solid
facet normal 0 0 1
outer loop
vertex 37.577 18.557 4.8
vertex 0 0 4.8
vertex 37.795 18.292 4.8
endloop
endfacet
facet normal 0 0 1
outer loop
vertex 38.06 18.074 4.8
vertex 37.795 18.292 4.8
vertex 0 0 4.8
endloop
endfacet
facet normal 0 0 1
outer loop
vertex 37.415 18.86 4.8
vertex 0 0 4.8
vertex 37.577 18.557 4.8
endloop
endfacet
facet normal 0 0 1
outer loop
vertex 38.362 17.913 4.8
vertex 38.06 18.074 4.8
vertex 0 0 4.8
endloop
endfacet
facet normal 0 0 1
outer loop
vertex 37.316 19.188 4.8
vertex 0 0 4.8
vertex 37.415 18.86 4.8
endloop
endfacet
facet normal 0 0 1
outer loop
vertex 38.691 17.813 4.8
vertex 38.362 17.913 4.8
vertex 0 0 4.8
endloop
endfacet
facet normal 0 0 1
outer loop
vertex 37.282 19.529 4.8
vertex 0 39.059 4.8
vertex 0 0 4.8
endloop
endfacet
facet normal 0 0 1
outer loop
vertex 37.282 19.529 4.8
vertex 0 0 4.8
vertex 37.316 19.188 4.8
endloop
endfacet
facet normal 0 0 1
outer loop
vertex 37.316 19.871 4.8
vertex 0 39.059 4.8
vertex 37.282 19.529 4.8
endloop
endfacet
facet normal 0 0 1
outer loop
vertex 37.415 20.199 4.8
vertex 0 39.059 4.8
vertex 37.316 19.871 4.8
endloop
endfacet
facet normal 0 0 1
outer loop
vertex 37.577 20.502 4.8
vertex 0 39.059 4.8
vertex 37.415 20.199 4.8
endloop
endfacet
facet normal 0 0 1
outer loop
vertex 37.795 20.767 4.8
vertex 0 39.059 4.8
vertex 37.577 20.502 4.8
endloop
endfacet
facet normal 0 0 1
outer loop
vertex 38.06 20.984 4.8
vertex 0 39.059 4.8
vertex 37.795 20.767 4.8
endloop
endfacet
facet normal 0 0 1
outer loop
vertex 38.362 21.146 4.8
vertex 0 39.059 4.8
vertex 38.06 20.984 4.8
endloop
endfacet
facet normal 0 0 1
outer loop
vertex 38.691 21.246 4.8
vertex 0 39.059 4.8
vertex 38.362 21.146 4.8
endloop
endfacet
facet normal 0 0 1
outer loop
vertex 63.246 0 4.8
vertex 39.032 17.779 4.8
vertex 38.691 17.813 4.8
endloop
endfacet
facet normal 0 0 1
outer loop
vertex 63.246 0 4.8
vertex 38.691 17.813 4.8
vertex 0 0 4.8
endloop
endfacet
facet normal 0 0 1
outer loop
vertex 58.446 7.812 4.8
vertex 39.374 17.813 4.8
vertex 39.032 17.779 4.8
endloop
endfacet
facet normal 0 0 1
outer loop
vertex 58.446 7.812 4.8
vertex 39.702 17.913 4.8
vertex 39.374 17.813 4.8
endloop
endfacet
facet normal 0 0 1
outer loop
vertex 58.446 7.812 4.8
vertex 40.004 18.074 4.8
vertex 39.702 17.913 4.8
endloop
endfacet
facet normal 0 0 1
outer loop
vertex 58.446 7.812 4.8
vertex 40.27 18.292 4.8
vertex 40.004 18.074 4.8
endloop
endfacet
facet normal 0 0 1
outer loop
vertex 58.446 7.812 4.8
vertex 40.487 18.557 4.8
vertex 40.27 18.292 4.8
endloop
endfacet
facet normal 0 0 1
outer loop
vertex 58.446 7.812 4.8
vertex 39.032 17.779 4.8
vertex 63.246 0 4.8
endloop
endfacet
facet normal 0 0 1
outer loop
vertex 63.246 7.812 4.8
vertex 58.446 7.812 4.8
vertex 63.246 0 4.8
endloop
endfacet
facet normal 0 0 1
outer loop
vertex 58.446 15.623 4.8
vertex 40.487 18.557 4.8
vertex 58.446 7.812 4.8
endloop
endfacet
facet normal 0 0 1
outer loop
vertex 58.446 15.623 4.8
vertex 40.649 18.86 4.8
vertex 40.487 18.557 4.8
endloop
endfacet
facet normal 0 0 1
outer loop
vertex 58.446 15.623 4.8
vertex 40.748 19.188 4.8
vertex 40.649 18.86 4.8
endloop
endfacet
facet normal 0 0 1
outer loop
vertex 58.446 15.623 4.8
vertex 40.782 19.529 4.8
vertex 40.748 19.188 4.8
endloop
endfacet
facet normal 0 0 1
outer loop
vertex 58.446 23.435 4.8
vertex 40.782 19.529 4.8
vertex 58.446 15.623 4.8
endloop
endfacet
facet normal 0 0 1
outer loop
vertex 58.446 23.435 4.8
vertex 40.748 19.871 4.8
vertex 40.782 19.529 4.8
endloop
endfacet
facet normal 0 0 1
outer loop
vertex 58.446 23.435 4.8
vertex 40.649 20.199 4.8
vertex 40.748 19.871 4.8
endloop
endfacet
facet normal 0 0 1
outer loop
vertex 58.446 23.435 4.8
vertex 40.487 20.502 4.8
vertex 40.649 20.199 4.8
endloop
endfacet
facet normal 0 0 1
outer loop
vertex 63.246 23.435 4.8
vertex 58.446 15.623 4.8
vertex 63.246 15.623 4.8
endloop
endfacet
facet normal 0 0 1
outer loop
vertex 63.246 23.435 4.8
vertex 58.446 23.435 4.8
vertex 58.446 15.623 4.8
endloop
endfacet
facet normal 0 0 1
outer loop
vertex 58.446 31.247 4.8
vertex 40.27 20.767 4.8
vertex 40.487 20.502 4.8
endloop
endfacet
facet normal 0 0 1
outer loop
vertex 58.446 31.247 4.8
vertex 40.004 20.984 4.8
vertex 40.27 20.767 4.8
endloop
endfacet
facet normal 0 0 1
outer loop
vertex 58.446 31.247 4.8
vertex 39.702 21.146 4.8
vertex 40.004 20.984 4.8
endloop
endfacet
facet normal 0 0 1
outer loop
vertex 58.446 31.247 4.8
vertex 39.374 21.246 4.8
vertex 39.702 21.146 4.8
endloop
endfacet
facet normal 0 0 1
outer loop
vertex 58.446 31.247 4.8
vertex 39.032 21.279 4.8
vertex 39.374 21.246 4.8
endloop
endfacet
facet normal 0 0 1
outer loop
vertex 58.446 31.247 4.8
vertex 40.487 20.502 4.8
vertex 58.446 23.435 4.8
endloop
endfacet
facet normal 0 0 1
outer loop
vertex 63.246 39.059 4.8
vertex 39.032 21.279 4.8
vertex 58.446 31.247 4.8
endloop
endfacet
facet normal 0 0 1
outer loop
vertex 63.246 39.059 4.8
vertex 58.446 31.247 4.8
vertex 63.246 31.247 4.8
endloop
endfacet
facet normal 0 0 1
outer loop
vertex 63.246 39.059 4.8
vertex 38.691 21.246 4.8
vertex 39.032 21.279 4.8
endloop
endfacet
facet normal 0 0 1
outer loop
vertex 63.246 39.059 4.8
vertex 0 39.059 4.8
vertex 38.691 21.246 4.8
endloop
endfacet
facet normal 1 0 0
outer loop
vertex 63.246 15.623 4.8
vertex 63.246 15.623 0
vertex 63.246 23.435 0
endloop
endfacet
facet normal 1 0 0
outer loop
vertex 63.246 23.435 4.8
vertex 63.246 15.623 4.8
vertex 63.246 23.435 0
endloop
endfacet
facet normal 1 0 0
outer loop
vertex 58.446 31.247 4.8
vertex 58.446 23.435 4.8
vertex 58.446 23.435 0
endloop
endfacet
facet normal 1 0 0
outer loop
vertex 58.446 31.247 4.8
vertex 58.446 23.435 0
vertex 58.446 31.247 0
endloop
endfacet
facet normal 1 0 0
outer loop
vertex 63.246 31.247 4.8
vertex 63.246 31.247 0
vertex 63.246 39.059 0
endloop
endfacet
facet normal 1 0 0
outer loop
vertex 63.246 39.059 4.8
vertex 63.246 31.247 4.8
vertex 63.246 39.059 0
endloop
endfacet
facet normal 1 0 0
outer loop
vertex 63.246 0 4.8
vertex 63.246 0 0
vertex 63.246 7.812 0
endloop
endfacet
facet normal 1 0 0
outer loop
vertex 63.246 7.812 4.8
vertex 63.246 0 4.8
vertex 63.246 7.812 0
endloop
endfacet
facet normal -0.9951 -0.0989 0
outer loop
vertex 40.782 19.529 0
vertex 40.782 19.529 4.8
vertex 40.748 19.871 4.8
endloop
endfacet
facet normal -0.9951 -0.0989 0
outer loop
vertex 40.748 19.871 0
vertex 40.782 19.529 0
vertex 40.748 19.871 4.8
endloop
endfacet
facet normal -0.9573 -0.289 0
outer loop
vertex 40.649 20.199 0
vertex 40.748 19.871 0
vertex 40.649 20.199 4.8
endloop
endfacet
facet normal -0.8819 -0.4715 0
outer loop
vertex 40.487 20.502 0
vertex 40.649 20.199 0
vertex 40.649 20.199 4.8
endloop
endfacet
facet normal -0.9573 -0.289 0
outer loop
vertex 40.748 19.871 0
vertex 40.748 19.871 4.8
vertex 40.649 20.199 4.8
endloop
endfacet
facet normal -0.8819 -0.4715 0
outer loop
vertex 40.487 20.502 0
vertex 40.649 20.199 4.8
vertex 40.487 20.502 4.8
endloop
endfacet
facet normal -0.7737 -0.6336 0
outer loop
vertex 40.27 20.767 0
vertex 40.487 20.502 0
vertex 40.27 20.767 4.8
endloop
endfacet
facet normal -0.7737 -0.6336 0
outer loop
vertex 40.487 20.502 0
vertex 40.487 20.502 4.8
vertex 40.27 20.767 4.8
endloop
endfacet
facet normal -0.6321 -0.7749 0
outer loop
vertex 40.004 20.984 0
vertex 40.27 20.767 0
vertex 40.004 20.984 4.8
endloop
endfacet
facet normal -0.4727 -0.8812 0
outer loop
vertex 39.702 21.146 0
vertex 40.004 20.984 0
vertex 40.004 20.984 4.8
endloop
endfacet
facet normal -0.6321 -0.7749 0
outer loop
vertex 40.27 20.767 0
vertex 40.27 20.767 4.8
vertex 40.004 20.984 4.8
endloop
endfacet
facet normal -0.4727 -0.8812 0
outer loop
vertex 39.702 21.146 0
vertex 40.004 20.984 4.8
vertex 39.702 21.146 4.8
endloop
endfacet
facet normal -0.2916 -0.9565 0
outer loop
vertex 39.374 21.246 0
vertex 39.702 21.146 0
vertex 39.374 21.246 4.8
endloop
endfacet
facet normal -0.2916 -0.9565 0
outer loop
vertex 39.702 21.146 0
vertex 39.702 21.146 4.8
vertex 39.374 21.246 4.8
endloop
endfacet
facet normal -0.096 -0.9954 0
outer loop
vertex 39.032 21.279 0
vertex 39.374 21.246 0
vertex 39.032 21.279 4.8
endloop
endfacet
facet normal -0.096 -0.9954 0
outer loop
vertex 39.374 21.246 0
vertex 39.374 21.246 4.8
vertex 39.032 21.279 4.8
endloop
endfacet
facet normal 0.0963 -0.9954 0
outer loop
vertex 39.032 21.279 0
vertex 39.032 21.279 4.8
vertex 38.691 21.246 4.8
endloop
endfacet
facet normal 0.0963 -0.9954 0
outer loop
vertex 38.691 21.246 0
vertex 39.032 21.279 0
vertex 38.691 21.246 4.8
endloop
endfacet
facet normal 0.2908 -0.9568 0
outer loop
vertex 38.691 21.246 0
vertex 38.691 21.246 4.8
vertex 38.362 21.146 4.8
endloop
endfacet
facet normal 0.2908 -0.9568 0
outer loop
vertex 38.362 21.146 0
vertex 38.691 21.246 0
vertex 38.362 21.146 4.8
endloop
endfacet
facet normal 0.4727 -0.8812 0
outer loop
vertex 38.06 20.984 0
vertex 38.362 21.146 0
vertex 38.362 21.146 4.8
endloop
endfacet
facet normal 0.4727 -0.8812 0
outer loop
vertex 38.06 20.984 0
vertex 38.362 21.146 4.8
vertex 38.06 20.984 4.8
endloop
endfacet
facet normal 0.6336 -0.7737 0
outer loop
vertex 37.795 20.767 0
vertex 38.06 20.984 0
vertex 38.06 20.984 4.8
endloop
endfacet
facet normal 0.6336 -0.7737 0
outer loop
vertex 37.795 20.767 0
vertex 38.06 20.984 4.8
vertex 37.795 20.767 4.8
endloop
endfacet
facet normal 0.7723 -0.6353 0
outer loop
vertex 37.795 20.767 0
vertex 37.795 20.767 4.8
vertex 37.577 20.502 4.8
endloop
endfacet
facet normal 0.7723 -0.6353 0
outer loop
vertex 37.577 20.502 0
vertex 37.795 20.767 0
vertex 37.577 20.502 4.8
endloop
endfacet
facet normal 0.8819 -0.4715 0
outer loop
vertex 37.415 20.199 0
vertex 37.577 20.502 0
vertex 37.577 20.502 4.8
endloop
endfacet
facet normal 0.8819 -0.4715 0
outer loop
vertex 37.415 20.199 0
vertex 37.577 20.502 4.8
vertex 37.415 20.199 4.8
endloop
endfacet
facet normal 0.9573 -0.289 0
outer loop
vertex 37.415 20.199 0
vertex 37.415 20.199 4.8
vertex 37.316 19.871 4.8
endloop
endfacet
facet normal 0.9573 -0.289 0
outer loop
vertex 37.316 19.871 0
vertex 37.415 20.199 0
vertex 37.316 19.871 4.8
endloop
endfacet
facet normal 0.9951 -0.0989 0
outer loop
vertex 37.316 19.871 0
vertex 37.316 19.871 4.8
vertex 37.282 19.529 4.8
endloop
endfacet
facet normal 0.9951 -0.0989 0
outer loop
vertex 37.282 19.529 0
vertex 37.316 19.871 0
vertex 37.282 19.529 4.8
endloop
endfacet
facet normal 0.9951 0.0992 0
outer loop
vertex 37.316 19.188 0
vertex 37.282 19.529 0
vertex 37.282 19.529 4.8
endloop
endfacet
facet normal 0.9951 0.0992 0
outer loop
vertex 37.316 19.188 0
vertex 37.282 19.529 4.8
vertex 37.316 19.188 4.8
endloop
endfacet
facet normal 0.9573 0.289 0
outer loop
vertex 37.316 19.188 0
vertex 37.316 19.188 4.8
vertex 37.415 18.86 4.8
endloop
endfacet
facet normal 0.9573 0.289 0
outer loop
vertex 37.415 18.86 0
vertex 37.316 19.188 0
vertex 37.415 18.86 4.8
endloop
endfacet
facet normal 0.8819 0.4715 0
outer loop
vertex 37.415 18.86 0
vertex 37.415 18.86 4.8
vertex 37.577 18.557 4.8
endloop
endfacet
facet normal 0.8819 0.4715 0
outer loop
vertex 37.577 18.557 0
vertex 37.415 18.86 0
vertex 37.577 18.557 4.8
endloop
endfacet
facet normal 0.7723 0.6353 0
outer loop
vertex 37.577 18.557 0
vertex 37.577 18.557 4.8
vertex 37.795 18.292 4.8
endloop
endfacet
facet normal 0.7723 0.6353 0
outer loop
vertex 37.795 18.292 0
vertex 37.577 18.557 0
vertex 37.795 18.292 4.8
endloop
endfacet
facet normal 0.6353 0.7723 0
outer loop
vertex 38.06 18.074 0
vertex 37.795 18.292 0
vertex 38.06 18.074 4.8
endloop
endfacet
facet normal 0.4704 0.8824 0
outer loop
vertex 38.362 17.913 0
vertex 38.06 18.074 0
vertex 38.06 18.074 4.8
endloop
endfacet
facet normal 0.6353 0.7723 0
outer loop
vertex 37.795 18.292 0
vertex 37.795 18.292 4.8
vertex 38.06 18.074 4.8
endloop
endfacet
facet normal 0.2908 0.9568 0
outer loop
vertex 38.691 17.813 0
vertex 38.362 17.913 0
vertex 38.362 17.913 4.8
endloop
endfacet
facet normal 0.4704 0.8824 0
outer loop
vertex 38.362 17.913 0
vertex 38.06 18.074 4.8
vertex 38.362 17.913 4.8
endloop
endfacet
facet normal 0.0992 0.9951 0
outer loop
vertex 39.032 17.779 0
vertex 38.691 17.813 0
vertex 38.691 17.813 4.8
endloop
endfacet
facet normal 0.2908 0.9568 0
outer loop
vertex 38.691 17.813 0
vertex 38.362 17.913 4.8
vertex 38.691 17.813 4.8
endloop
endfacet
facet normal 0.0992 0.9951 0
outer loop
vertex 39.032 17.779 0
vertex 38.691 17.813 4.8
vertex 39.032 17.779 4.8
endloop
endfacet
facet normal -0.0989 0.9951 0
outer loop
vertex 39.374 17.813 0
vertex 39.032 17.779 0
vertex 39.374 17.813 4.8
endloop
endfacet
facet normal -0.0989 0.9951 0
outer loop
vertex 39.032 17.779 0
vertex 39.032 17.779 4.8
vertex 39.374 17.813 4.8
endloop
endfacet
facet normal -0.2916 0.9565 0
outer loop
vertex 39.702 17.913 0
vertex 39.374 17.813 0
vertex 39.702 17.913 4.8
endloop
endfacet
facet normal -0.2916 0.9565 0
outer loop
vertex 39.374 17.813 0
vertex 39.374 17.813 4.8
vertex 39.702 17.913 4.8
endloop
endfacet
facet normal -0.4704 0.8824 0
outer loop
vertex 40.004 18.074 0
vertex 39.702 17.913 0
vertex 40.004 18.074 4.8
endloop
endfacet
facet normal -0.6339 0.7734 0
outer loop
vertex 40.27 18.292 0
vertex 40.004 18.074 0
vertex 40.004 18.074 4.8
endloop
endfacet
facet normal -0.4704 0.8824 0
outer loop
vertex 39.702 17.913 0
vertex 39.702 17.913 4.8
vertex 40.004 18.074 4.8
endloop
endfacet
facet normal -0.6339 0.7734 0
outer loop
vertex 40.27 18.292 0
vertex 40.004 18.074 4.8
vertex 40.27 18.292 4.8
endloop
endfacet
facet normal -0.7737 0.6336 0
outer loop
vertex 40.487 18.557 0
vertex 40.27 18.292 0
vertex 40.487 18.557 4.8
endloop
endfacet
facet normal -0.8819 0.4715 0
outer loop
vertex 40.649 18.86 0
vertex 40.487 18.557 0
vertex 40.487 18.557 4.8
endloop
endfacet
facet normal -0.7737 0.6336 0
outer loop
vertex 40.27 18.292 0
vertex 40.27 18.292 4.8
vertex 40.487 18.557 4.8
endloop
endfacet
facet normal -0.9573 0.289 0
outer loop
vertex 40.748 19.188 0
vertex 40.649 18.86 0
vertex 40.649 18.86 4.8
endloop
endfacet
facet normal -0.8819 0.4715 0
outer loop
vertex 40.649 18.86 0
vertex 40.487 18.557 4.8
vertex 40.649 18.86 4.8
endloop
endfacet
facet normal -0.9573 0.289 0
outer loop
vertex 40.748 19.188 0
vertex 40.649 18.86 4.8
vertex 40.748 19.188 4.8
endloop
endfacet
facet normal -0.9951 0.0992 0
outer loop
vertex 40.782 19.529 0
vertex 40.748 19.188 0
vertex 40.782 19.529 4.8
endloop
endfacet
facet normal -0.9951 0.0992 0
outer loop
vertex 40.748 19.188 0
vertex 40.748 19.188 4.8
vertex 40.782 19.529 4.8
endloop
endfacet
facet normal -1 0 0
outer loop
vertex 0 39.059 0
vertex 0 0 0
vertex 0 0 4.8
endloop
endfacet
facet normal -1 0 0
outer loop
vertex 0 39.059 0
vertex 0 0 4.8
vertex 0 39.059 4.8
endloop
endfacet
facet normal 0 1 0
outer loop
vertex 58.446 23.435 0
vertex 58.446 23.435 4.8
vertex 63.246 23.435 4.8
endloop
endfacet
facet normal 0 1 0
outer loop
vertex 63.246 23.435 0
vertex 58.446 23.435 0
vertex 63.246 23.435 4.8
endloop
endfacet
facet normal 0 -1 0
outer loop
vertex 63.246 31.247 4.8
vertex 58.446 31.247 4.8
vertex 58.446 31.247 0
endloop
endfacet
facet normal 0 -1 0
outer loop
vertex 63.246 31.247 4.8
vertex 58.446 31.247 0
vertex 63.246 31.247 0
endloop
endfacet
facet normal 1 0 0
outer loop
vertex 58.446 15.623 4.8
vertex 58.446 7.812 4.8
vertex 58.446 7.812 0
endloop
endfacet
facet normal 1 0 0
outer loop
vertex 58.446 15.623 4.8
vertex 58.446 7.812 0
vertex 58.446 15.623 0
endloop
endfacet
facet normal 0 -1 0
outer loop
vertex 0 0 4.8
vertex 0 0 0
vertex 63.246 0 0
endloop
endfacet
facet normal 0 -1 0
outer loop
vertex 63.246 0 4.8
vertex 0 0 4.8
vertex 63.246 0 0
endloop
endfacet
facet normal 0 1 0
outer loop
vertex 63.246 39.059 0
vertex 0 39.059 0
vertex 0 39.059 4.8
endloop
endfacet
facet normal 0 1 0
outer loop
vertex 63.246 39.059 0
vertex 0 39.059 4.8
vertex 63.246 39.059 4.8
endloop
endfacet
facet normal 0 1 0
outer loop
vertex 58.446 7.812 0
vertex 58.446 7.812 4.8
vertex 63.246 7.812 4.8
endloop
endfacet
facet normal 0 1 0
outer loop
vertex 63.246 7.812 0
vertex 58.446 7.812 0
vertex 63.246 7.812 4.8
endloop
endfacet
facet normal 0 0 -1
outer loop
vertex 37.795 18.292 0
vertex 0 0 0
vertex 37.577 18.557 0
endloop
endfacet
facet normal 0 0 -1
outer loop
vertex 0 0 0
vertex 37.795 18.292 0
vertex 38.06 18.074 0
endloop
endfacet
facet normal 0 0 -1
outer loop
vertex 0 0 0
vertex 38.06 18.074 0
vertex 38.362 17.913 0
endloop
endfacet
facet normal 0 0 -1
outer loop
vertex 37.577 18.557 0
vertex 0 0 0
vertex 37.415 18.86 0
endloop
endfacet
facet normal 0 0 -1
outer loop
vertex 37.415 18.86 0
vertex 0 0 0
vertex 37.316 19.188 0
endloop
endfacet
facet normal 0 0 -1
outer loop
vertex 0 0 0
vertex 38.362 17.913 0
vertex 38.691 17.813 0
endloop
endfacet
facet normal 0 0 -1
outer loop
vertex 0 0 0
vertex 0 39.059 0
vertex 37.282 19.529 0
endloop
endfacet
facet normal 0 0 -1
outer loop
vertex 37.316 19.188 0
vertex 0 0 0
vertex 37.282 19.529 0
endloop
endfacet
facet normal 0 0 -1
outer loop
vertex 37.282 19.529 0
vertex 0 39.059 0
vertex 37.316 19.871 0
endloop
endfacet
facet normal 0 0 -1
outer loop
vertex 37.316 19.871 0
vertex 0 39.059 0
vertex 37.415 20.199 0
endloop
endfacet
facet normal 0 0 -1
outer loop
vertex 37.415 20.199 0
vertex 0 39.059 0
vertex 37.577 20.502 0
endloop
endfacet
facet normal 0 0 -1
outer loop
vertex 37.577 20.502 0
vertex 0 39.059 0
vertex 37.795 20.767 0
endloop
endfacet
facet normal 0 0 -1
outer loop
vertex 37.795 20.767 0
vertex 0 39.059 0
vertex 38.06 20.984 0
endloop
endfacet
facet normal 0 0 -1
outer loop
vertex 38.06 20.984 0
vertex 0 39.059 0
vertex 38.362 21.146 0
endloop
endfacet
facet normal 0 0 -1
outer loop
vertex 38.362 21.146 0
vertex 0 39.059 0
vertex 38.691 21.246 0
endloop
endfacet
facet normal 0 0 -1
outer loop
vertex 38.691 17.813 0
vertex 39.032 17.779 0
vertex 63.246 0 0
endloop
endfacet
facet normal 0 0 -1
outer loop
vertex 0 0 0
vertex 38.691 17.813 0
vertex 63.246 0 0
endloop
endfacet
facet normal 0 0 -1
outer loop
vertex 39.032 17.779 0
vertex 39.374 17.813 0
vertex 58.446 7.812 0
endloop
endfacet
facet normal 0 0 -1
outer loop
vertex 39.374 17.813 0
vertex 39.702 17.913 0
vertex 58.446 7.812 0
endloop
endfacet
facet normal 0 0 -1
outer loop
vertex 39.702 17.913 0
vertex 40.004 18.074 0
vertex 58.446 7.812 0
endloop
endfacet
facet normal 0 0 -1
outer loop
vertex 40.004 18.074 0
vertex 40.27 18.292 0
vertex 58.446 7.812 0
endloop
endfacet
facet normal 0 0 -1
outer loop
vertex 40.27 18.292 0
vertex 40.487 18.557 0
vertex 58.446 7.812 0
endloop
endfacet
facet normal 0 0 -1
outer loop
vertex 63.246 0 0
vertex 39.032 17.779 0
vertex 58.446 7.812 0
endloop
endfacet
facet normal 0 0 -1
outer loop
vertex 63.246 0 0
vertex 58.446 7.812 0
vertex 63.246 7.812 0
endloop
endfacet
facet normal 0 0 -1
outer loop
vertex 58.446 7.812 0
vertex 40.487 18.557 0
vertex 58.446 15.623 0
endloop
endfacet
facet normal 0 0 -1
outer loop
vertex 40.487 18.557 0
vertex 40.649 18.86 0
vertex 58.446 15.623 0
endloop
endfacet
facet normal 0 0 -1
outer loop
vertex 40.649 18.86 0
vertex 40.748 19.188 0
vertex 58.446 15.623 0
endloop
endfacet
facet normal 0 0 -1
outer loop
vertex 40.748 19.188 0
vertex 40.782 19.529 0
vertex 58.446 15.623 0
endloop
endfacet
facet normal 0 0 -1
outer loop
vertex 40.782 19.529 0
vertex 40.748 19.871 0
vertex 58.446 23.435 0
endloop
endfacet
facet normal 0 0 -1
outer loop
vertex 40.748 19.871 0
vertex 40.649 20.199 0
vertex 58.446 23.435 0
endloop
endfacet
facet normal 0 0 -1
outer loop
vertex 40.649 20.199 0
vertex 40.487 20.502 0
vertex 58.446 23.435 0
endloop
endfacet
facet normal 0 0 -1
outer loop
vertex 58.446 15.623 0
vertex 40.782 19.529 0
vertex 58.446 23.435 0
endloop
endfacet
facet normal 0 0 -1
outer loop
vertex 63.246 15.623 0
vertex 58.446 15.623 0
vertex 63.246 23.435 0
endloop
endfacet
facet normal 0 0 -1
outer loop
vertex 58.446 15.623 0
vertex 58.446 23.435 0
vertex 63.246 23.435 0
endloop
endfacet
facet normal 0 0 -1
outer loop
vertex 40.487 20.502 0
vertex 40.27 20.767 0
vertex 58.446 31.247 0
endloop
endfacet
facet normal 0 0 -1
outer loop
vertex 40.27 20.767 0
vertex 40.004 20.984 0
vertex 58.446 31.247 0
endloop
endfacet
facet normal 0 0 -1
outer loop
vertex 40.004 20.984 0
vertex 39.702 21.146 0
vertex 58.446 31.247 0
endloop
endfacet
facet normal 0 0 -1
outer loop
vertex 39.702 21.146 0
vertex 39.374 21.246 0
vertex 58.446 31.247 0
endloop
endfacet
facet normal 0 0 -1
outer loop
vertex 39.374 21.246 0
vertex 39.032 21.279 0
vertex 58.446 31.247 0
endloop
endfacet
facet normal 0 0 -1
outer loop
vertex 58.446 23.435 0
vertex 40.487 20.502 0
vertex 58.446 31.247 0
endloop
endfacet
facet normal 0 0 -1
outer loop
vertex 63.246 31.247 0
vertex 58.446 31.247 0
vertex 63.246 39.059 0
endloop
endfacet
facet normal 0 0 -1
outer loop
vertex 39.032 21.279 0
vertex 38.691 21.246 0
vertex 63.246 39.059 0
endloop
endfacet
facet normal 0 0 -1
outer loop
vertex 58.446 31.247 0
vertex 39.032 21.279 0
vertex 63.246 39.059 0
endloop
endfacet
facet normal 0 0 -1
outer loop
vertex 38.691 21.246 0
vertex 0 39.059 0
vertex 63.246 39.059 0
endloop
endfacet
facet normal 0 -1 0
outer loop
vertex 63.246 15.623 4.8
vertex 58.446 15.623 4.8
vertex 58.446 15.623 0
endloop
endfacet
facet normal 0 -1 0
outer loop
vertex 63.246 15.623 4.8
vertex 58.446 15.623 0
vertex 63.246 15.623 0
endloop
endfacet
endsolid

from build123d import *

# Parameters (mm, degrees)
SKETCH2_W           = 63.246
SKETCH2_H           = 39.058596
BOSS_EXTRUDE1_DEPTH = 4.800000052
SKETCH5_W           = 4.800000052
SKETCH5_H           = 7.8117192
CUT_EXTRUDE1_DEPTH  = 75.489398158
SKETCH6_R           = 1.750000056
CUT_EXTRUDE2_DEPTH  = 75.489398158


with BuildPart() as part:
    # Sketch2 → Boss-Extrude1 (new body)
    with BuildSketch(Plane.XY):
        with Locations((31.623, 19.529298)):
            Rectangle(SKETCH2_W, SKETCH2_H)
    extrude(amount=BOSS_EXTRUDE1_DEPTH)

    # Sketch5 → Cut-Extrude1 (cut, through all)
    with BuildSketch(Plane.XY.offset(4.800000052)):
        with Locations((60.845999974, 11.7175788)):
            Rectangle(SKETCH5_W, SKETCH5_H)
        with Locations((60.845999974, 27.3410172)):
            Rectangle(SKETCH5_W, SKETCH5_H)
    extrude(amount=-CUT_EXTRUDE1_DEPTH, mode=Mode.SUBTRACT)

    # Sketch6 → Cut-Extrude2 (cut, through all)
    with BuildSketch(Plane.XY.offset(4.800000052)):
        with Locations((39.032113706, 19.529298)):
            Circle(SKETCH6_R)
    extrude(amount=-CUT_EXTRUDE2_DEPTH, mode=Mode.SUBTRACT)


solid = part.part
